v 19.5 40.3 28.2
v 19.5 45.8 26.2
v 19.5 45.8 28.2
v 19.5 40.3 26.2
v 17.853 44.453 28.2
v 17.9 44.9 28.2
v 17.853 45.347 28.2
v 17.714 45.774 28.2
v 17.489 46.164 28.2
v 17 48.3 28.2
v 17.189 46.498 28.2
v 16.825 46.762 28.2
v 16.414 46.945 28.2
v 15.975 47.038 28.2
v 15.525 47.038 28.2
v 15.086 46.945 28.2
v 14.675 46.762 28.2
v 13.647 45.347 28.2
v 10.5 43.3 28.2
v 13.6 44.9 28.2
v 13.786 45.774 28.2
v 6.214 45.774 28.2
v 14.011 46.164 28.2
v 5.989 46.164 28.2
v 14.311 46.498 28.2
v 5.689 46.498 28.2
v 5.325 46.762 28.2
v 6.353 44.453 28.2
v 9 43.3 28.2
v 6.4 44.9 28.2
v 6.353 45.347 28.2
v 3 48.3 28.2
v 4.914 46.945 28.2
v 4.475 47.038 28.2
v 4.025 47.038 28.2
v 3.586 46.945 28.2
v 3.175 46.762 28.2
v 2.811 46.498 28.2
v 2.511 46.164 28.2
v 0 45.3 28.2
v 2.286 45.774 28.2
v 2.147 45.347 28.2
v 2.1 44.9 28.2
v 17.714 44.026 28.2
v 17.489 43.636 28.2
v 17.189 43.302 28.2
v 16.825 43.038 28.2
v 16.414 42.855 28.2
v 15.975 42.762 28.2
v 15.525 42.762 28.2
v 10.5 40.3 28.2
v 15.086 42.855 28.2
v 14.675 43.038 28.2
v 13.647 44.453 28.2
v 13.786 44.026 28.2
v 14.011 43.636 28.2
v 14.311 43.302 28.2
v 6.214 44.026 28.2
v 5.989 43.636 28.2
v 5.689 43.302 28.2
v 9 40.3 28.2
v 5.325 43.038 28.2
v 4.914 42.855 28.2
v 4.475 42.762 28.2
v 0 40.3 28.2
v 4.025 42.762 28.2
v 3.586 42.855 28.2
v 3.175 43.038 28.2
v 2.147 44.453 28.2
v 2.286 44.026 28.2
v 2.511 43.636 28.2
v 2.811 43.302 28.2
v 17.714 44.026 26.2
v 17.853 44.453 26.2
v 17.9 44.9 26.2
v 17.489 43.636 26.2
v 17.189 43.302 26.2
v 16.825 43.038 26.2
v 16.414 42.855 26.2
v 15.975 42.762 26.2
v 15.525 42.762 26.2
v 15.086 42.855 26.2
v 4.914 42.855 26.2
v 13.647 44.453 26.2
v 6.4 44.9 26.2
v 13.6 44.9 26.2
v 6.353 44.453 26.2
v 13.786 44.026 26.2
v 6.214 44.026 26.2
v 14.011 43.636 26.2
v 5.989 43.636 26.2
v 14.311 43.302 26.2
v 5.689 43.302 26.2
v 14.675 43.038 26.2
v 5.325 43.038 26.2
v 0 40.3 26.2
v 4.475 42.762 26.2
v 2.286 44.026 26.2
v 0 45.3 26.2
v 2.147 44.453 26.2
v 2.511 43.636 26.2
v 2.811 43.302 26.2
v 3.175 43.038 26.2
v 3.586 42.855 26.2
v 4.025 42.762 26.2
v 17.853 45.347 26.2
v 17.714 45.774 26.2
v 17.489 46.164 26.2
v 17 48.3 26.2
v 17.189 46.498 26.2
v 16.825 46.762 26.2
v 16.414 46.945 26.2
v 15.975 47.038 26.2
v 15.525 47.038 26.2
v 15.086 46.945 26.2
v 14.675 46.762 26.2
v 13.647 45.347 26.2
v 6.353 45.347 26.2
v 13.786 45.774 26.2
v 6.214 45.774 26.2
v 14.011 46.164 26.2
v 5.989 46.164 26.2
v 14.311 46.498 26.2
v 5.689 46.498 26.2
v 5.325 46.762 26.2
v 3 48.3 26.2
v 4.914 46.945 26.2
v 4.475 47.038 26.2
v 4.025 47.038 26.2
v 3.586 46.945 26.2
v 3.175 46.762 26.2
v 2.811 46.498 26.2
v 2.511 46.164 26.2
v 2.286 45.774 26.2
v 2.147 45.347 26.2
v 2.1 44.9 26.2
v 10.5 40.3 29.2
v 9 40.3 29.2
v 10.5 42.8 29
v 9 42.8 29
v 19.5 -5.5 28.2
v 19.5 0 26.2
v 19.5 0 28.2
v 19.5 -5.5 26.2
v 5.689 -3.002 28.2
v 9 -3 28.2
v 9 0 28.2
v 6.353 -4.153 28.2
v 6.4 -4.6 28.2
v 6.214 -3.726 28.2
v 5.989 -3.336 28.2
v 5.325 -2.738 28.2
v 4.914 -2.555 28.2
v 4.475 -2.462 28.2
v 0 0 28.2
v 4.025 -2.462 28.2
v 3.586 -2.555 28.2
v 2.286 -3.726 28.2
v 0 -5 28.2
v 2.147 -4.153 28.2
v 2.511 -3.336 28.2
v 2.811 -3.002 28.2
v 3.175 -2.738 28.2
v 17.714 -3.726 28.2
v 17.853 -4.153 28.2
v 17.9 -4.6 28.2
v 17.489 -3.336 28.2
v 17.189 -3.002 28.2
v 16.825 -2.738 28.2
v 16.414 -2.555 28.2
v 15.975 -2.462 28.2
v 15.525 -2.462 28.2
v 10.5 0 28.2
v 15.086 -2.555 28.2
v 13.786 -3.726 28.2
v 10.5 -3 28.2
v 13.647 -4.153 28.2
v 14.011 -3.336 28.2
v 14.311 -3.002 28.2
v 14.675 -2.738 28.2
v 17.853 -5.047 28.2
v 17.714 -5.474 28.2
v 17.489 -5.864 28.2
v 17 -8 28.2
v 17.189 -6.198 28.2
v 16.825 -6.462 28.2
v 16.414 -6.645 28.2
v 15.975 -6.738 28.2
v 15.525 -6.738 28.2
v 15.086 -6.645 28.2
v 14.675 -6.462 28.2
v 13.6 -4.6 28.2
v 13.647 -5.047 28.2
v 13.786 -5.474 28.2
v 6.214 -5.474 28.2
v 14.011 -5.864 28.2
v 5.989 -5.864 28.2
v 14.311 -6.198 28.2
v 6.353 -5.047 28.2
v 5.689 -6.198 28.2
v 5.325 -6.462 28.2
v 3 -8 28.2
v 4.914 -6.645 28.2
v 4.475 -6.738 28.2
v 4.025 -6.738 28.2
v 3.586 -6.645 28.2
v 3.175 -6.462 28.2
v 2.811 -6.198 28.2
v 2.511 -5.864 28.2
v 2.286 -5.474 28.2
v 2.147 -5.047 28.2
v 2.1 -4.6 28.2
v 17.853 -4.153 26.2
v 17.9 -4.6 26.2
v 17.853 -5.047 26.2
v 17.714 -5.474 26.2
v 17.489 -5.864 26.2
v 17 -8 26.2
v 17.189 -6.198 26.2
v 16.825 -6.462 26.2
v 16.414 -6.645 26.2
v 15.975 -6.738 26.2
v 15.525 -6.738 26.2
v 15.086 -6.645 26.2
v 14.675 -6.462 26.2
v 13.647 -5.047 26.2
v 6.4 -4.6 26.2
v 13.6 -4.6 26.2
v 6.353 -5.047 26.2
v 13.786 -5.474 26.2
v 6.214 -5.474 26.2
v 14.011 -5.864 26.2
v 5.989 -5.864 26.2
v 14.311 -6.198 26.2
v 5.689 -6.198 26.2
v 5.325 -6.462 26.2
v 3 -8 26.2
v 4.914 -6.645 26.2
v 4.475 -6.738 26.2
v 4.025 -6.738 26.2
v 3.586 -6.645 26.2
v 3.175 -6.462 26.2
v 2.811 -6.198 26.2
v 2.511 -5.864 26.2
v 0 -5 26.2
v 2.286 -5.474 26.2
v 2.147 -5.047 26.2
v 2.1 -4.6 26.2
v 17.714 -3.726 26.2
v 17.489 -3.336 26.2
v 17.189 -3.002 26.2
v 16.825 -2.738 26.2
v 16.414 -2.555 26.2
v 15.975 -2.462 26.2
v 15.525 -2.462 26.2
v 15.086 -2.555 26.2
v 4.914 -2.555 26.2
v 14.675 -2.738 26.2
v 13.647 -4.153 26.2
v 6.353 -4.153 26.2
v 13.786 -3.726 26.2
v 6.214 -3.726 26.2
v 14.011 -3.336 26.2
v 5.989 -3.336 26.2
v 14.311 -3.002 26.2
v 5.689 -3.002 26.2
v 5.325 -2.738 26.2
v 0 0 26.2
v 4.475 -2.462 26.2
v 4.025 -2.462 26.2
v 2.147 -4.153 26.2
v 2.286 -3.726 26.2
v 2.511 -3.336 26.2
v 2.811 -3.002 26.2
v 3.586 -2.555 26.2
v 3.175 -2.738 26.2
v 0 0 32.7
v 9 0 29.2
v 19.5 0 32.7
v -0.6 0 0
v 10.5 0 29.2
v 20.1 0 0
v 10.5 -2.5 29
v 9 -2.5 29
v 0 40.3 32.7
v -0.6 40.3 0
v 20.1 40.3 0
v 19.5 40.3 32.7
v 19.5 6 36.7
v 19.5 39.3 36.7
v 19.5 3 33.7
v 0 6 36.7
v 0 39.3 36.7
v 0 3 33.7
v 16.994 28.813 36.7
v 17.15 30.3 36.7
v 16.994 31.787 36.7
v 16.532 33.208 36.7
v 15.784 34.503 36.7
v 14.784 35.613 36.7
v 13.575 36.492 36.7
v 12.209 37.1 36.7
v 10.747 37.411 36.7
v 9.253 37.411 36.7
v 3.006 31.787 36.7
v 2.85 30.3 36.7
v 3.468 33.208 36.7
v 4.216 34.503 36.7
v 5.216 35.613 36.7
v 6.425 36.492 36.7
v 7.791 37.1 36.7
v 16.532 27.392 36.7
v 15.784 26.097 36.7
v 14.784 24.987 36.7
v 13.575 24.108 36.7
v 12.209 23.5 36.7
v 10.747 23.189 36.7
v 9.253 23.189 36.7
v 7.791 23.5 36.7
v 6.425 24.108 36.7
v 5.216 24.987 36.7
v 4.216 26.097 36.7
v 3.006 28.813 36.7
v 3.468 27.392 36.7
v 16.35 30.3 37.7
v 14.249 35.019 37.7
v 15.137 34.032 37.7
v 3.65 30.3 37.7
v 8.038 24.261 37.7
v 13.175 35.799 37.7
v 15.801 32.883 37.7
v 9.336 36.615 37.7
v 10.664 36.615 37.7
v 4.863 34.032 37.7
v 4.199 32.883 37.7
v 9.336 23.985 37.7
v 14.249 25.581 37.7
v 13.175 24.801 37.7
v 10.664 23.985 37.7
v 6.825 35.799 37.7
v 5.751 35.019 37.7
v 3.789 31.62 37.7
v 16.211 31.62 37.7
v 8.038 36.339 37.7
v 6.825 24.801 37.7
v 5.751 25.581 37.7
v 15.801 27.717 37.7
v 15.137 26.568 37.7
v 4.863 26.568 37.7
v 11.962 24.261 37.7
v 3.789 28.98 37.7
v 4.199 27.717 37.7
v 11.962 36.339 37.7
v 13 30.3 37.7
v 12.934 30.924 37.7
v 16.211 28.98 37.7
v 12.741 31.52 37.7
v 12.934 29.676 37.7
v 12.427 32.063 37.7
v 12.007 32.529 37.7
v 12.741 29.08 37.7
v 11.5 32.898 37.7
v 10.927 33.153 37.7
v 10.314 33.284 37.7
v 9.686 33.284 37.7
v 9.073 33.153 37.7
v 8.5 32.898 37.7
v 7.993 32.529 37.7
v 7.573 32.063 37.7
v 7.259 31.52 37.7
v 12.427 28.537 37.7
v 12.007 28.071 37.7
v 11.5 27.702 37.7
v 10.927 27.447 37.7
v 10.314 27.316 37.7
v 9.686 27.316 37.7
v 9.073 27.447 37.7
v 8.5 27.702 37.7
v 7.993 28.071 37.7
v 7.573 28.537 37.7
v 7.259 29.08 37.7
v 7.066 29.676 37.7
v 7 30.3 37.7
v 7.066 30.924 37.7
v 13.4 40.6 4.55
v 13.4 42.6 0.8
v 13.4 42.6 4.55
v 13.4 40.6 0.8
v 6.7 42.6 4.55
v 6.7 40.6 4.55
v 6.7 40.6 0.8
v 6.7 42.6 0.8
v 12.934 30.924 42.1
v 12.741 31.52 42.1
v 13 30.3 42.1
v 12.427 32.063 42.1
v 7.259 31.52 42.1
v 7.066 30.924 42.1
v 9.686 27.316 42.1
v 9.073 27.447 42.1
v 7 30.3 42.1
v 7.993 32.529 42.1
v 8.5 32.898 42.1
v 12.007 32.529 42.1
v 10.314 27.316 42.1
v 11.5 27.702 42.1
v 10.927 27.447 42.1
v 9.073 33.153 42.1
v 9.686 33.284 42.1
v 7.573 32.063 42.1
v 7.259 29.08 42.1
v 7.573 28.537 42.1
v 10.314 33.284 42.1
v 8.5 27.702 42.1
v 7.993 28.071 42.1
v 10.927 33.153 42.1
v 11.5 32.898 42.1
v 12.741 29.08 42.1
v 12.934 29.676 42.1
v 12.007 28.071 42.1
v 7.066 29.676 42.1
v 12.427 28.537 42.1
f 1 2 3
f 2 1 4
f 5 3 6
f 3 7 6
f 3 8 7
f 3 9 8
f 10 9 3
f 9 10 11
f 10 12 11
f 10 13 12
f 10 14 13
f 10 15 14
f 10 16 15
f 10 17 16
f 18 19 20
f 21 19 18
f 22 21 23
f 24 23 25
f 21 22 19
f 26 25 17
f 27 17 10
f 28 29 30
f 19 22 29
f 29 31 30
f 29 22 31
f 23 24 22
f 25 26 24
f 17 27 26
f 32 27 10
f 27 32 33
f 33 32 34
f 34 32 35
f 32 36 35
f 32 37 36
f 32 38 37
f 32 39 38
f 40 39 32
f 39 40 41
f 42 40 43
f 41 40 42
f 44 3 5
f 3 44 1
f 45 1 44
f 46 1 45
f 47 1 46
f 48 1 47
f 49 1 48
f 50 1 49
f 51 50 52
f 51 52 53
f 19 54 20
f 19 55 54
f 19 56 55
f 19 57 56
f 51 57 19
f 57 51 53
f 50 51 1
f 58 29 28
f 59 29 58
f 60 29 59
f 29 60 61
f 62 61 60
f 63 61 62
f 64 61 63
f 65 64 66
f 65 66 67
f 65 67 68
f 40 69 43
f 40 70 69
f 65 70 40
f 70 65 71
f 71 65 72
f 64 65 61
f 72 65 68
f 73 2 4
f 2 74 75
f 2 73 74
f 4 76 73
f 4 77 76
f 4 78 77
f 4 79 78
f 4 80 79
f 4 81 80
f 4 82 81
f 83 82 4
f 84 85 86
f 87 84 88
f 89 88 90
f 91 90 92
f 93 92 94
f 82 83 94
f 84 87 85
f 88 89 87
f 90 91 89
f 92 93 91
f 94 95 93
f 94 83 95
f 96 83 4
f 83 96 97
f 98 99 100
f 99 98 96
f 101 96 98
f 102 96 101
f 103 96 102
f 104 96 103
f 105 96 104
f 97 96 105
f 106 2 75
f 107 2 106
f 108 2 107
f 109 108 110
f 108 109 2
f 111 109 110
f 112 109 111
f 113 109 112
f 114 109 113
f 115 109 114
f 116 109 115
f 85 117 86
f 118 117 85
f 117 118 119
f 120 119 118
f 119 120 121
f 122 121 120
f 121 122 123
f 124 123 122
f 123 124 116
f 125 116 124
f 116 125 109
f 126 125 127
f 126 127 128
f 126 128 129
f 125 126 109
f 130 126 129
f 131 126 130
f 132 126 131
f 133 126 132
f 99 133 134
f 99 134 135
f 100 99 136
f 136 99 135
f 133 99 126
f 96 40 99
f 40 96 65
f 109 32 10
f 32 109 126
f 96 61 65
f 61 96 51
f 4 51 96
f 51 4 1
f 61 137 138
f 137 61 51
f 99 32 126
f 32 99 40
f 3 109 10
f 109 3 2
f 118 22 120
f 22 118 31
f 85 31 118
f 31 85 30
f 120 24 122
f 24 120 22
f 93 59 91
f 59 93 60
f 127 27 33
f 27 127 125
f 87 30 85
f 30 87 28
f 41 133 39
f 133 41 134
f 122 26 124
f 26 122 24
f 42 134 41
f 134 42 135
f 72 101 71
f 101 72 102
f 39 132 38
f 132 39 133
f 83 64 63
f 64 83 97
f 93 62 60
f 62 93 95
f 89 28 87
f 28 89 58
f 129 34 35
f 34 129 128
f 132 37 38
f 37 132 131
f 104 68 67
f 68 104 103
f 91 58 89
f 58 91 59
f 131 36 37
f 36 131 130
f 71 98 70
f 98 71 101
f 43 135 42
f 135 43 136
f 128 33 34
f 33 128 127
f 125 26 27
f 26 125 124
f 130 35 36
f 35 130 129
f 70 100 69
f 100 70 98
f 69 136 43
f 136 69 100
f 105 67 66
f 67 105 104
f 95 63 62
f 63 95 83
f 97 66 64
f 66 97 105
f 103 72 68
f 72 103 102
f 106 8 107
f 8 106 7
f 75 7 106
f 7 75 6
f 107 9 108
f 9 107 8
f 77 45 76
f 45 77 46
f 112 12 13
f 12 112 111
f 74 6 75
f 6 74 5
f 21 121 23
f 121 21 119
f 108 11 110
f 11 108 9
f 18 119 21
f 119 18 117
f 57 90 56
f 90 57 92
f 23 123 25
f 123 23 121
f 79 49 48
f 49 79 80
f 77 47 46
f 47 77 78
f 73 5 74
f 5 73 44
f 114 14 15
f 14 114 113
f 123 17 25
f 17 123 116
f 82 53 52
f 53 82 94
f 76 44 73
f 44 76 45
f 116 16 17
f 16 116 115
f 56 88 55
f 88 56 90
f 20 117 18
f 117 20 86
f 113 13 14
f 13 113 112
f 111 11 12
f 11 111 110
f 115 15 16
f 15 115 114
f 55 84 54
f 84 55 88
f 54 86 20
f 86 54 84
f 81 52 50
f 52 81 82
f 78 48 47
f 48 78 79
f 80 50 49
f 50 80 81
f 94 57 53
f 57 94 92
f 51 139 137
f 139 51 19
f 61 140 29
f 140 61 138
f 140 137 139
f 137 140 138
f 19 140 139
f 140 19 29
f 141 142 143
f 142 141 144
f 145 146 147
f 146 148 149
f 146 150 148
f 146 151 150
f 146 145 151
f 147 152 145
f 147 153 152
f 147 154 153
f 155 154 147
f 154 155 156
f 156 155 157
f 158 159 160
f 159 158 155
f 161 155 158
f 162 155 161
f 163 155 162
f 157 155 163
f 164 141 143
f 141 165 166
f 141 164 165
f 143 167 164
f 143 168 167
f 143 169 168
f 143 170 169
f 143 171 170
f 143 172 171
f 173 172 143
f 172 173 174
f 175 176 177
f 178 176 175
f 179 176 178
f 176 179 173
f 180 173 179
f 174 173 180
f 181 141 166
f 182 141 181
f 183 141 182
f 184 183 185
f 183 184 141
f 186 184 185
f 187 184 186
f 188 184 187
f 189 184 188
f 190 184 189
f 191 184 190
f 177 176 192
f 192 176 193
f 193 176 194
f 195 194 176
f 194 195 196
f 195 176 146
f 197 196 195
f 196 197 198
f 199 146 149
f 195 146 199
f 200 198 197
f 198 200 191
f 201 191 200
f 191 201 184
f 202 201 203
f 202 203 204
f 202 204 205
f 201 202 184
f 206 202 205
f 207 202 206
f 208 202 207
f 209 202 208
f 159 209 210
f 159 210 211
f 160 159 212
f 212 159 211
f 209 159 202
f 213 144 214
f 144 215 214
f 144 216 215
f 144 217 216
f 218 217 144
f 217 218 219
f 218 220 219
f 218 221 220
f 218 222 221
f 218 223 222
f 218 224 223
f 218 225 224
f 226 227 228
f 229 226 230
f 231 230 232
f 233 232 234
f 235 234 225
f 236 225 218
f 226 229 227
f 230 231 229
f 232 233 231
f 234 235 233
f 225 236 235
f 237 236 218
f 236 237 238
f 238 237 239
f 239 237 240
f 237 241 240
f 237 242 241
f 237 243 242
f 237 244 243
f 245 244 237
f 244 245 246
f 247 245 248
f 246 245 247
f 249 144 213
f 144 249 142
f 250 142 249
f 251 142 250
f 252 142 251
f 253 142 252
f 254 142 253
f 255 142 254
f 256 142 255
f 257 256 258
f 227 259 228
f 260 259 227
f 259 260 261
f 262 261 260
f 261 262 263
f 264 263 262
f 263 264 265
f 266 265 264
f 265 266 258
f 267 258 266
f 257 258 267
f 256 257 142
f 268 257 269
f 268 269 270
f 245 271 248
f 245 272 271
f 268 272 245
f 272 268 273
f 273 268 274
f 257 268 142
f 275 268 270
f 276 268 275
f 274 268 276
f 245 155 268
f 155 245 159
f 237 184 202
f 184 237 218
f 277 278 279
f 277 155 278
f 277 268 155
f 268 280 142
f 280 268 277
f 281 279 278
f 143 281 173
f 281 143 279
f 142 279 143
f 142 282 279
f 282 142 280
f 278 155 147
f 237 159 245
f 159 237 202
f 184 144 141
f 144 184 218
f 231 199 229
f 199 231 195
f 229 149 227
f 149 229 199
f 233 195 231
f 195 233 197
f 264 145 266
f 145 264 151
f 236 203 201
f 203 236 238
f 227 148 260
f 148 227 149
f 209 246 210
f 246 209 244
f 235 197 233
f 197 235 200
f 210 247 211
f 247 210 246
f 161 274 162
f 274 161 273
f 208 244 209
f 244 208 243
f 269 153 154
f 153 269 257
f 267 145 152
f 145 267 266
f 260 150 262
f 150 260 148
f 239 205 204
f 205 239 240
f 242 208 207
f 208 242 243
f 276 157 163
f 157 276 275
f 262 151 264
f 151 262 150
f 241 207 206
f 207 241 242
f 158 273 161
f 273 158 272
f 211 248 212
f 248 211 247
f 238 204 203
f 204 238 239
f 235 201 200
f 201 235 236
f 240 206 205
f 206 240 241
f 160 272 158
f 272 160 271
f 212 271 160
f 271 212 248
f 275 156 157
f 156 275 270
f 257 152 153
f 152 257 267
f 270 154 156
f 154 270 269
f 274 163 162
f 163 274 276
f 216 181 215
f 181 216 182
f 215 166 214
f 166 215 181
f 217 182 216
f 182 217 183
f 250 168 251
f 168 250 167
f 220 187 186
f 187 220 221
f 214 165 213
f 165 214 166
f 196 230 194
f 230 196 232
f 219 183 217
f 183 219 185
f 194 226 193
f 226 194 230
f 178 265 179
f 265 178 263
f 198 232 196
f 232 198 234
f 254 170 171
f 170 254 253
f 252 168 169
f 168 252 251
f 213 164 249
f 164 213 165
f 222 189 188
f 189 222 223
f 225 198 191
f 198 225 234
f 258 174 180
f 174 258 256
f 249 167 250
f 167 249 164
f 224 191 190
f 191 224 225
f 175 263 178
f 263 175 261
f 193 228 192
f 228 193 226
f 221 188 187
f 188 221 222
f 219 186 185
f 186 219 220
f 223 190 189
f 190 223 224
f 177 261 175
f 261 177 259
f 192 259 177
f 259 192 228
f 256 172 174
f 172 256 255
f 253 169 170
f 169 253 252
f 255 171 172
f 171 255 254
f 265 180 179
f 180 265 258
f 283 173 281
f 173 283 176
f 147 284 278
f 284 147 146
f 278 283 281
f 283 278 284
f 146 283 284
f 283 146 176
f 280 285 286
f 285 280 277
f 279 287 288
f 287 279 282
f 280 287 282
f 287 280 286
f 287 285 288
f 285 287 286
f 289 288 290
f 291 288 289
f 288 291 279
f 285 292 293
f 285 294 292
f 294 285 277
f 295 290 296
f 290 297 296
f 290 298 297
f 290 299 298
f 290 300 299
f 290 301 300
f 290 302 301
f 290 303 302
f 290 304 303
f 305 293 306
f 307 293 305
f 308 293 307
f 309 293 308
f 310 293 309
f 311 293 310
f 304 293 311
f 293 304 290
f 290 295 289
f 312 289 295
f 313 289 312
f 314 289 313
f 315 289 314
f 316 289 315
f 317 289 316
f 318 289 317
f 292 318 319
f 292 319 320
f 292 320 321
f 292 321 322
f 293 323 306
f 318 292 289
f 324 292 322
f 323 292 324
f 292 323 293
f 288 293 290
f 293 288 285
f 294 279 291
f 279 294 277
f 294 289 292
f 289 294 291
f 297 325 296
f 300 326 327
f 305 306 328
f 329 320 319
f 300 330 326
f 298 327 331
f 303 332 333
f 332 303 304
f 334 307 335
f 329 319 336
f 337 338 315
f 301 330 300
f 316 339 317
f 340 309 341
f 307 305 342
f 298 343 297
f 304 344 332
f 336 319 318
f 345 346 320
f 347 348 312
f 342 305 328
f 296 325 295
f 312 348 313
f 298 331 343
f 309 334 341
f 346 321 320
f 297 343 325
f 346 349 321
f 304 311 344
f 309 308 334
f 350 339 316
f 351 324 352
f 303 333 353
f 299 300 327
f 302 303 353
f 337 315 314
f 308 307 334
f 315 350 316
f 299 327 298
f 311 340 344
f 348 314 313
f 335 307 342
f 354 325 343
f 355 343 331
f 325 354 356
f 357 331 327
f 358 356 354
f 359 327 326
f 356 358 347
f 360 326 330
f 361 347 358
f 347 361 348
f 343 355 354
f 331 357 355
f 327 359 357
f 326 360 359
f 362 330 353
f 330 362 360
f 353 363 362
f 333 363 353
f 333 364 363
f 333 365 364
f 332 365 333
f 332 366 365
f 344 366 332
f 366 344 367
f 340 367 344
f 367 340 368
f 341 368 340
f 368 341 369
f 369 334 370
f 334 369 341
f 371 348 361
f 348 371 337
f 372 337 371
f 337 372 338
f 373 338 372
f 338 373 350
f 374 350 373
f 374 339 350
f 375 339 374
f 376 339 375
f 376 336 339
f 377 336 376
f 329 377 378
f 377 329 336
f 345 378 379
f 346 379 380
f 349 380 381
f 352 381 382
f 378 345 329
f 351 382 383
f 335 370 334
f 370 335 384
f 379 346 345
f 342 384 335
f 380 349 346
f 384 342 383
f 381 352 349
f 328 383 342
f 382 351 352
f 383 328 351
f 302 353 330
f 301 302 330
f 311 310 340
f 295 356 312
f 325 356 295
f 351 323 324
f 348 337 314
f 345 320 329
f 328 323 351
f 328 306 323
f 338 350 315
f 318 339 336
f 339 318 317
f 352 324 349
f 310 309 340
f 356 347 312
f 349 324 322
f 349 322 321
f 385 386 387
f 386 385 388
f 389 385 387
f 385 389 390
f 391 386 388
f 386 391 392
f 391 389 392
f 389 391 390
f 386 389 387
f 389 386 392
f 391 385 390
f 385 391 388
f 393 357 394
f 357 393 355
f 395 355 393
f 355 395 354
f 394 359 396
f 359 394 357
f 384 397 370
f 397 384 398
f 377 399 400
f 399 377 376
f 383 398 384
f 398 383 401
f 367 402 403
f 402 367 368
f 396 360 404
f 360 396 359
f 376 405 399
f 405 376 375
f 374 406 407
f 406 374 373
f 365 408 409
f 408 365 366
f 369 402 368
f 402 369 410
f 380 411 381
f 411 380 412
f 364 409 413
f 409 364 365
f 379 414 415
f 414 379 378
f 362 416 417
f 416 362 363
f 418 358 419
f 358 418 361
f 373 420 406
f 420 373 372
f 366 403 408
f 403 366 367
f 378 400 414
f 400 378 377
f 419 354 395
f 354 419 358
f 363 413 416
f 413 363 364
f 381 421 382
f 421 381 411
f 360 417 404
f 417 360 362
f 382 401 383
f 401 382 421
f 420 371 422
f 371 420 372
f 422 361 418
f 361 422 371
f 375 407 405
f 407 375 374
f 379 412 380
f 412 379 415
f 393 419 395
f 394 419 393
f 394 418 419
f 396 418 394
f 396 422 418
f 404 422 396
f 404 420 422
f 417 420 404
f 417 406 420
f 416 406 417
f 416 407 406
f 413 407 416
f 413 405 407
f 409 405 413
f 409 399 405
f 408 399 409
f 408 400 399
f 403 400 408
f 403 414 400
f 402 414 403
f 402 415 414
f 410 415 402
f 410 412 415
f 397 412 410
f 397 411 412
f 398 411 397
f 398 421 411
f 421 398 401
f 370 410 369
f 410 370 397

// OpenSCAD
//
// Modelcraft RS 2 Servo
//

// Set the length of segments in a cylinder to have a decent resolution
$fs=0.3;

// A wedge made from a polyhedron
module wedge(width, length, height)
{
	polyhedron(
		points=[ 
			[0, 0, 0], [0, length, 0], [0, length, height],
			[width, 0, 0], [width, length, 0], [width, length, height] 
			],
		triangles= [ 
			[0, 1, 2], 
			[3, 5, 4], 
			[1, 4, 2], 
			[4, 5, 2],
			[0, 3, 4],
			[0, 4, 1],
			[0, 2, 5],
			[0, 5, 3]
			] );
}

// A wedge made from a polyhedron
module wedge2(width1, width2, length, height)
{

}

module body(width1, width2, length, height)
{
	extraWidth = width2 - width1;
	polyhedron(
		points=[ 
			[-extraWidth, 0, 0], [-extraWidth, length, 0], [0, length, height],
			[width2, 0, 0], [width2, length, 0], [width1, length, height],
			[0, 0, height], [width1, 0, height]
			],
		triangles= [ 
			[0, 1, 2], 
			[3, 5, 4], 
			[1, 4, 2], 
			[4, 5, 2],
			[0, 3, 4],
			[0, 4, 1],
			[0, 6, 7],
			[3, 0, 7],
			[0, 2, 6],
			[3, 7, 5],
			[6, 5, 7],
			[6, 2, 5],
			] );}

// A mount point on one side of the servo
module mount()
{
	difference()
	{
		cube([19.5, 8, 2]);
		translate([0, 5, -1]) rotate([0, 0, 45]) cube([19.5, 8, 4]);
		translate([17, 8, -1]) rotate([0, 0, -45]) cube([19.5, 8, 4]);
		translate([4.25, 4.6, -1]) cylinder(r=2.15, h=4);
		translate([15.75, 4.6, -1]) cylinder(r=2.15, h=4);
	}
	translate([9.0, 0, 2]) cube([1.5, 2.5, 0.8]);
	translate([9.0, 2.5, 2.8]) mirror([0, 1, 0]) wedge(1.5, 2.5, 0.2);
	translate([9.0, 3, 2]) mirror([0, 1, 0]) wedge(1.5, 0.5, 0.8);
}

color("darkslategray")
{

// Left mount
translate([0, 40.3, 26.2]) mount();

// Right mount
translate([0, 0, 26.2]) mirror([0, 1, 0]) mount();

// Main body
//cube([19.5, 40.3, 32.7]);
body(19.5, 20.1, 40.3, 32.7);

// Upper body parts
translate([0, 3, 32.7]) cube([19.5, 36.4, 1]);
translate([0, 6, 33.7]) cube([19.5, 33.3, 3]);

// Wedges in the upper body part
translate([0, 40.3, 32.7]) mirror([0, 1, 0]) wedge(19.5, 1.0, 4);
translate([0, 0, 32.7]) wedge(19.5, 3.0, 1);
translate([0, 3, 33.7]) wedge(19.5, 3.0, 3);

// Ring around shaft
translate([10, 30.3, 36.7]) cylinder(r1=7.15, r2=6.35, h=1);

// Cable outlet
translate([6.7, 40.6, 0.8]) cube([6.7, 2, 3.75]);


}

// Shaft
color("white") translate([10, 30.3, 36.7]) cylinder(r=3, h=5.4);
